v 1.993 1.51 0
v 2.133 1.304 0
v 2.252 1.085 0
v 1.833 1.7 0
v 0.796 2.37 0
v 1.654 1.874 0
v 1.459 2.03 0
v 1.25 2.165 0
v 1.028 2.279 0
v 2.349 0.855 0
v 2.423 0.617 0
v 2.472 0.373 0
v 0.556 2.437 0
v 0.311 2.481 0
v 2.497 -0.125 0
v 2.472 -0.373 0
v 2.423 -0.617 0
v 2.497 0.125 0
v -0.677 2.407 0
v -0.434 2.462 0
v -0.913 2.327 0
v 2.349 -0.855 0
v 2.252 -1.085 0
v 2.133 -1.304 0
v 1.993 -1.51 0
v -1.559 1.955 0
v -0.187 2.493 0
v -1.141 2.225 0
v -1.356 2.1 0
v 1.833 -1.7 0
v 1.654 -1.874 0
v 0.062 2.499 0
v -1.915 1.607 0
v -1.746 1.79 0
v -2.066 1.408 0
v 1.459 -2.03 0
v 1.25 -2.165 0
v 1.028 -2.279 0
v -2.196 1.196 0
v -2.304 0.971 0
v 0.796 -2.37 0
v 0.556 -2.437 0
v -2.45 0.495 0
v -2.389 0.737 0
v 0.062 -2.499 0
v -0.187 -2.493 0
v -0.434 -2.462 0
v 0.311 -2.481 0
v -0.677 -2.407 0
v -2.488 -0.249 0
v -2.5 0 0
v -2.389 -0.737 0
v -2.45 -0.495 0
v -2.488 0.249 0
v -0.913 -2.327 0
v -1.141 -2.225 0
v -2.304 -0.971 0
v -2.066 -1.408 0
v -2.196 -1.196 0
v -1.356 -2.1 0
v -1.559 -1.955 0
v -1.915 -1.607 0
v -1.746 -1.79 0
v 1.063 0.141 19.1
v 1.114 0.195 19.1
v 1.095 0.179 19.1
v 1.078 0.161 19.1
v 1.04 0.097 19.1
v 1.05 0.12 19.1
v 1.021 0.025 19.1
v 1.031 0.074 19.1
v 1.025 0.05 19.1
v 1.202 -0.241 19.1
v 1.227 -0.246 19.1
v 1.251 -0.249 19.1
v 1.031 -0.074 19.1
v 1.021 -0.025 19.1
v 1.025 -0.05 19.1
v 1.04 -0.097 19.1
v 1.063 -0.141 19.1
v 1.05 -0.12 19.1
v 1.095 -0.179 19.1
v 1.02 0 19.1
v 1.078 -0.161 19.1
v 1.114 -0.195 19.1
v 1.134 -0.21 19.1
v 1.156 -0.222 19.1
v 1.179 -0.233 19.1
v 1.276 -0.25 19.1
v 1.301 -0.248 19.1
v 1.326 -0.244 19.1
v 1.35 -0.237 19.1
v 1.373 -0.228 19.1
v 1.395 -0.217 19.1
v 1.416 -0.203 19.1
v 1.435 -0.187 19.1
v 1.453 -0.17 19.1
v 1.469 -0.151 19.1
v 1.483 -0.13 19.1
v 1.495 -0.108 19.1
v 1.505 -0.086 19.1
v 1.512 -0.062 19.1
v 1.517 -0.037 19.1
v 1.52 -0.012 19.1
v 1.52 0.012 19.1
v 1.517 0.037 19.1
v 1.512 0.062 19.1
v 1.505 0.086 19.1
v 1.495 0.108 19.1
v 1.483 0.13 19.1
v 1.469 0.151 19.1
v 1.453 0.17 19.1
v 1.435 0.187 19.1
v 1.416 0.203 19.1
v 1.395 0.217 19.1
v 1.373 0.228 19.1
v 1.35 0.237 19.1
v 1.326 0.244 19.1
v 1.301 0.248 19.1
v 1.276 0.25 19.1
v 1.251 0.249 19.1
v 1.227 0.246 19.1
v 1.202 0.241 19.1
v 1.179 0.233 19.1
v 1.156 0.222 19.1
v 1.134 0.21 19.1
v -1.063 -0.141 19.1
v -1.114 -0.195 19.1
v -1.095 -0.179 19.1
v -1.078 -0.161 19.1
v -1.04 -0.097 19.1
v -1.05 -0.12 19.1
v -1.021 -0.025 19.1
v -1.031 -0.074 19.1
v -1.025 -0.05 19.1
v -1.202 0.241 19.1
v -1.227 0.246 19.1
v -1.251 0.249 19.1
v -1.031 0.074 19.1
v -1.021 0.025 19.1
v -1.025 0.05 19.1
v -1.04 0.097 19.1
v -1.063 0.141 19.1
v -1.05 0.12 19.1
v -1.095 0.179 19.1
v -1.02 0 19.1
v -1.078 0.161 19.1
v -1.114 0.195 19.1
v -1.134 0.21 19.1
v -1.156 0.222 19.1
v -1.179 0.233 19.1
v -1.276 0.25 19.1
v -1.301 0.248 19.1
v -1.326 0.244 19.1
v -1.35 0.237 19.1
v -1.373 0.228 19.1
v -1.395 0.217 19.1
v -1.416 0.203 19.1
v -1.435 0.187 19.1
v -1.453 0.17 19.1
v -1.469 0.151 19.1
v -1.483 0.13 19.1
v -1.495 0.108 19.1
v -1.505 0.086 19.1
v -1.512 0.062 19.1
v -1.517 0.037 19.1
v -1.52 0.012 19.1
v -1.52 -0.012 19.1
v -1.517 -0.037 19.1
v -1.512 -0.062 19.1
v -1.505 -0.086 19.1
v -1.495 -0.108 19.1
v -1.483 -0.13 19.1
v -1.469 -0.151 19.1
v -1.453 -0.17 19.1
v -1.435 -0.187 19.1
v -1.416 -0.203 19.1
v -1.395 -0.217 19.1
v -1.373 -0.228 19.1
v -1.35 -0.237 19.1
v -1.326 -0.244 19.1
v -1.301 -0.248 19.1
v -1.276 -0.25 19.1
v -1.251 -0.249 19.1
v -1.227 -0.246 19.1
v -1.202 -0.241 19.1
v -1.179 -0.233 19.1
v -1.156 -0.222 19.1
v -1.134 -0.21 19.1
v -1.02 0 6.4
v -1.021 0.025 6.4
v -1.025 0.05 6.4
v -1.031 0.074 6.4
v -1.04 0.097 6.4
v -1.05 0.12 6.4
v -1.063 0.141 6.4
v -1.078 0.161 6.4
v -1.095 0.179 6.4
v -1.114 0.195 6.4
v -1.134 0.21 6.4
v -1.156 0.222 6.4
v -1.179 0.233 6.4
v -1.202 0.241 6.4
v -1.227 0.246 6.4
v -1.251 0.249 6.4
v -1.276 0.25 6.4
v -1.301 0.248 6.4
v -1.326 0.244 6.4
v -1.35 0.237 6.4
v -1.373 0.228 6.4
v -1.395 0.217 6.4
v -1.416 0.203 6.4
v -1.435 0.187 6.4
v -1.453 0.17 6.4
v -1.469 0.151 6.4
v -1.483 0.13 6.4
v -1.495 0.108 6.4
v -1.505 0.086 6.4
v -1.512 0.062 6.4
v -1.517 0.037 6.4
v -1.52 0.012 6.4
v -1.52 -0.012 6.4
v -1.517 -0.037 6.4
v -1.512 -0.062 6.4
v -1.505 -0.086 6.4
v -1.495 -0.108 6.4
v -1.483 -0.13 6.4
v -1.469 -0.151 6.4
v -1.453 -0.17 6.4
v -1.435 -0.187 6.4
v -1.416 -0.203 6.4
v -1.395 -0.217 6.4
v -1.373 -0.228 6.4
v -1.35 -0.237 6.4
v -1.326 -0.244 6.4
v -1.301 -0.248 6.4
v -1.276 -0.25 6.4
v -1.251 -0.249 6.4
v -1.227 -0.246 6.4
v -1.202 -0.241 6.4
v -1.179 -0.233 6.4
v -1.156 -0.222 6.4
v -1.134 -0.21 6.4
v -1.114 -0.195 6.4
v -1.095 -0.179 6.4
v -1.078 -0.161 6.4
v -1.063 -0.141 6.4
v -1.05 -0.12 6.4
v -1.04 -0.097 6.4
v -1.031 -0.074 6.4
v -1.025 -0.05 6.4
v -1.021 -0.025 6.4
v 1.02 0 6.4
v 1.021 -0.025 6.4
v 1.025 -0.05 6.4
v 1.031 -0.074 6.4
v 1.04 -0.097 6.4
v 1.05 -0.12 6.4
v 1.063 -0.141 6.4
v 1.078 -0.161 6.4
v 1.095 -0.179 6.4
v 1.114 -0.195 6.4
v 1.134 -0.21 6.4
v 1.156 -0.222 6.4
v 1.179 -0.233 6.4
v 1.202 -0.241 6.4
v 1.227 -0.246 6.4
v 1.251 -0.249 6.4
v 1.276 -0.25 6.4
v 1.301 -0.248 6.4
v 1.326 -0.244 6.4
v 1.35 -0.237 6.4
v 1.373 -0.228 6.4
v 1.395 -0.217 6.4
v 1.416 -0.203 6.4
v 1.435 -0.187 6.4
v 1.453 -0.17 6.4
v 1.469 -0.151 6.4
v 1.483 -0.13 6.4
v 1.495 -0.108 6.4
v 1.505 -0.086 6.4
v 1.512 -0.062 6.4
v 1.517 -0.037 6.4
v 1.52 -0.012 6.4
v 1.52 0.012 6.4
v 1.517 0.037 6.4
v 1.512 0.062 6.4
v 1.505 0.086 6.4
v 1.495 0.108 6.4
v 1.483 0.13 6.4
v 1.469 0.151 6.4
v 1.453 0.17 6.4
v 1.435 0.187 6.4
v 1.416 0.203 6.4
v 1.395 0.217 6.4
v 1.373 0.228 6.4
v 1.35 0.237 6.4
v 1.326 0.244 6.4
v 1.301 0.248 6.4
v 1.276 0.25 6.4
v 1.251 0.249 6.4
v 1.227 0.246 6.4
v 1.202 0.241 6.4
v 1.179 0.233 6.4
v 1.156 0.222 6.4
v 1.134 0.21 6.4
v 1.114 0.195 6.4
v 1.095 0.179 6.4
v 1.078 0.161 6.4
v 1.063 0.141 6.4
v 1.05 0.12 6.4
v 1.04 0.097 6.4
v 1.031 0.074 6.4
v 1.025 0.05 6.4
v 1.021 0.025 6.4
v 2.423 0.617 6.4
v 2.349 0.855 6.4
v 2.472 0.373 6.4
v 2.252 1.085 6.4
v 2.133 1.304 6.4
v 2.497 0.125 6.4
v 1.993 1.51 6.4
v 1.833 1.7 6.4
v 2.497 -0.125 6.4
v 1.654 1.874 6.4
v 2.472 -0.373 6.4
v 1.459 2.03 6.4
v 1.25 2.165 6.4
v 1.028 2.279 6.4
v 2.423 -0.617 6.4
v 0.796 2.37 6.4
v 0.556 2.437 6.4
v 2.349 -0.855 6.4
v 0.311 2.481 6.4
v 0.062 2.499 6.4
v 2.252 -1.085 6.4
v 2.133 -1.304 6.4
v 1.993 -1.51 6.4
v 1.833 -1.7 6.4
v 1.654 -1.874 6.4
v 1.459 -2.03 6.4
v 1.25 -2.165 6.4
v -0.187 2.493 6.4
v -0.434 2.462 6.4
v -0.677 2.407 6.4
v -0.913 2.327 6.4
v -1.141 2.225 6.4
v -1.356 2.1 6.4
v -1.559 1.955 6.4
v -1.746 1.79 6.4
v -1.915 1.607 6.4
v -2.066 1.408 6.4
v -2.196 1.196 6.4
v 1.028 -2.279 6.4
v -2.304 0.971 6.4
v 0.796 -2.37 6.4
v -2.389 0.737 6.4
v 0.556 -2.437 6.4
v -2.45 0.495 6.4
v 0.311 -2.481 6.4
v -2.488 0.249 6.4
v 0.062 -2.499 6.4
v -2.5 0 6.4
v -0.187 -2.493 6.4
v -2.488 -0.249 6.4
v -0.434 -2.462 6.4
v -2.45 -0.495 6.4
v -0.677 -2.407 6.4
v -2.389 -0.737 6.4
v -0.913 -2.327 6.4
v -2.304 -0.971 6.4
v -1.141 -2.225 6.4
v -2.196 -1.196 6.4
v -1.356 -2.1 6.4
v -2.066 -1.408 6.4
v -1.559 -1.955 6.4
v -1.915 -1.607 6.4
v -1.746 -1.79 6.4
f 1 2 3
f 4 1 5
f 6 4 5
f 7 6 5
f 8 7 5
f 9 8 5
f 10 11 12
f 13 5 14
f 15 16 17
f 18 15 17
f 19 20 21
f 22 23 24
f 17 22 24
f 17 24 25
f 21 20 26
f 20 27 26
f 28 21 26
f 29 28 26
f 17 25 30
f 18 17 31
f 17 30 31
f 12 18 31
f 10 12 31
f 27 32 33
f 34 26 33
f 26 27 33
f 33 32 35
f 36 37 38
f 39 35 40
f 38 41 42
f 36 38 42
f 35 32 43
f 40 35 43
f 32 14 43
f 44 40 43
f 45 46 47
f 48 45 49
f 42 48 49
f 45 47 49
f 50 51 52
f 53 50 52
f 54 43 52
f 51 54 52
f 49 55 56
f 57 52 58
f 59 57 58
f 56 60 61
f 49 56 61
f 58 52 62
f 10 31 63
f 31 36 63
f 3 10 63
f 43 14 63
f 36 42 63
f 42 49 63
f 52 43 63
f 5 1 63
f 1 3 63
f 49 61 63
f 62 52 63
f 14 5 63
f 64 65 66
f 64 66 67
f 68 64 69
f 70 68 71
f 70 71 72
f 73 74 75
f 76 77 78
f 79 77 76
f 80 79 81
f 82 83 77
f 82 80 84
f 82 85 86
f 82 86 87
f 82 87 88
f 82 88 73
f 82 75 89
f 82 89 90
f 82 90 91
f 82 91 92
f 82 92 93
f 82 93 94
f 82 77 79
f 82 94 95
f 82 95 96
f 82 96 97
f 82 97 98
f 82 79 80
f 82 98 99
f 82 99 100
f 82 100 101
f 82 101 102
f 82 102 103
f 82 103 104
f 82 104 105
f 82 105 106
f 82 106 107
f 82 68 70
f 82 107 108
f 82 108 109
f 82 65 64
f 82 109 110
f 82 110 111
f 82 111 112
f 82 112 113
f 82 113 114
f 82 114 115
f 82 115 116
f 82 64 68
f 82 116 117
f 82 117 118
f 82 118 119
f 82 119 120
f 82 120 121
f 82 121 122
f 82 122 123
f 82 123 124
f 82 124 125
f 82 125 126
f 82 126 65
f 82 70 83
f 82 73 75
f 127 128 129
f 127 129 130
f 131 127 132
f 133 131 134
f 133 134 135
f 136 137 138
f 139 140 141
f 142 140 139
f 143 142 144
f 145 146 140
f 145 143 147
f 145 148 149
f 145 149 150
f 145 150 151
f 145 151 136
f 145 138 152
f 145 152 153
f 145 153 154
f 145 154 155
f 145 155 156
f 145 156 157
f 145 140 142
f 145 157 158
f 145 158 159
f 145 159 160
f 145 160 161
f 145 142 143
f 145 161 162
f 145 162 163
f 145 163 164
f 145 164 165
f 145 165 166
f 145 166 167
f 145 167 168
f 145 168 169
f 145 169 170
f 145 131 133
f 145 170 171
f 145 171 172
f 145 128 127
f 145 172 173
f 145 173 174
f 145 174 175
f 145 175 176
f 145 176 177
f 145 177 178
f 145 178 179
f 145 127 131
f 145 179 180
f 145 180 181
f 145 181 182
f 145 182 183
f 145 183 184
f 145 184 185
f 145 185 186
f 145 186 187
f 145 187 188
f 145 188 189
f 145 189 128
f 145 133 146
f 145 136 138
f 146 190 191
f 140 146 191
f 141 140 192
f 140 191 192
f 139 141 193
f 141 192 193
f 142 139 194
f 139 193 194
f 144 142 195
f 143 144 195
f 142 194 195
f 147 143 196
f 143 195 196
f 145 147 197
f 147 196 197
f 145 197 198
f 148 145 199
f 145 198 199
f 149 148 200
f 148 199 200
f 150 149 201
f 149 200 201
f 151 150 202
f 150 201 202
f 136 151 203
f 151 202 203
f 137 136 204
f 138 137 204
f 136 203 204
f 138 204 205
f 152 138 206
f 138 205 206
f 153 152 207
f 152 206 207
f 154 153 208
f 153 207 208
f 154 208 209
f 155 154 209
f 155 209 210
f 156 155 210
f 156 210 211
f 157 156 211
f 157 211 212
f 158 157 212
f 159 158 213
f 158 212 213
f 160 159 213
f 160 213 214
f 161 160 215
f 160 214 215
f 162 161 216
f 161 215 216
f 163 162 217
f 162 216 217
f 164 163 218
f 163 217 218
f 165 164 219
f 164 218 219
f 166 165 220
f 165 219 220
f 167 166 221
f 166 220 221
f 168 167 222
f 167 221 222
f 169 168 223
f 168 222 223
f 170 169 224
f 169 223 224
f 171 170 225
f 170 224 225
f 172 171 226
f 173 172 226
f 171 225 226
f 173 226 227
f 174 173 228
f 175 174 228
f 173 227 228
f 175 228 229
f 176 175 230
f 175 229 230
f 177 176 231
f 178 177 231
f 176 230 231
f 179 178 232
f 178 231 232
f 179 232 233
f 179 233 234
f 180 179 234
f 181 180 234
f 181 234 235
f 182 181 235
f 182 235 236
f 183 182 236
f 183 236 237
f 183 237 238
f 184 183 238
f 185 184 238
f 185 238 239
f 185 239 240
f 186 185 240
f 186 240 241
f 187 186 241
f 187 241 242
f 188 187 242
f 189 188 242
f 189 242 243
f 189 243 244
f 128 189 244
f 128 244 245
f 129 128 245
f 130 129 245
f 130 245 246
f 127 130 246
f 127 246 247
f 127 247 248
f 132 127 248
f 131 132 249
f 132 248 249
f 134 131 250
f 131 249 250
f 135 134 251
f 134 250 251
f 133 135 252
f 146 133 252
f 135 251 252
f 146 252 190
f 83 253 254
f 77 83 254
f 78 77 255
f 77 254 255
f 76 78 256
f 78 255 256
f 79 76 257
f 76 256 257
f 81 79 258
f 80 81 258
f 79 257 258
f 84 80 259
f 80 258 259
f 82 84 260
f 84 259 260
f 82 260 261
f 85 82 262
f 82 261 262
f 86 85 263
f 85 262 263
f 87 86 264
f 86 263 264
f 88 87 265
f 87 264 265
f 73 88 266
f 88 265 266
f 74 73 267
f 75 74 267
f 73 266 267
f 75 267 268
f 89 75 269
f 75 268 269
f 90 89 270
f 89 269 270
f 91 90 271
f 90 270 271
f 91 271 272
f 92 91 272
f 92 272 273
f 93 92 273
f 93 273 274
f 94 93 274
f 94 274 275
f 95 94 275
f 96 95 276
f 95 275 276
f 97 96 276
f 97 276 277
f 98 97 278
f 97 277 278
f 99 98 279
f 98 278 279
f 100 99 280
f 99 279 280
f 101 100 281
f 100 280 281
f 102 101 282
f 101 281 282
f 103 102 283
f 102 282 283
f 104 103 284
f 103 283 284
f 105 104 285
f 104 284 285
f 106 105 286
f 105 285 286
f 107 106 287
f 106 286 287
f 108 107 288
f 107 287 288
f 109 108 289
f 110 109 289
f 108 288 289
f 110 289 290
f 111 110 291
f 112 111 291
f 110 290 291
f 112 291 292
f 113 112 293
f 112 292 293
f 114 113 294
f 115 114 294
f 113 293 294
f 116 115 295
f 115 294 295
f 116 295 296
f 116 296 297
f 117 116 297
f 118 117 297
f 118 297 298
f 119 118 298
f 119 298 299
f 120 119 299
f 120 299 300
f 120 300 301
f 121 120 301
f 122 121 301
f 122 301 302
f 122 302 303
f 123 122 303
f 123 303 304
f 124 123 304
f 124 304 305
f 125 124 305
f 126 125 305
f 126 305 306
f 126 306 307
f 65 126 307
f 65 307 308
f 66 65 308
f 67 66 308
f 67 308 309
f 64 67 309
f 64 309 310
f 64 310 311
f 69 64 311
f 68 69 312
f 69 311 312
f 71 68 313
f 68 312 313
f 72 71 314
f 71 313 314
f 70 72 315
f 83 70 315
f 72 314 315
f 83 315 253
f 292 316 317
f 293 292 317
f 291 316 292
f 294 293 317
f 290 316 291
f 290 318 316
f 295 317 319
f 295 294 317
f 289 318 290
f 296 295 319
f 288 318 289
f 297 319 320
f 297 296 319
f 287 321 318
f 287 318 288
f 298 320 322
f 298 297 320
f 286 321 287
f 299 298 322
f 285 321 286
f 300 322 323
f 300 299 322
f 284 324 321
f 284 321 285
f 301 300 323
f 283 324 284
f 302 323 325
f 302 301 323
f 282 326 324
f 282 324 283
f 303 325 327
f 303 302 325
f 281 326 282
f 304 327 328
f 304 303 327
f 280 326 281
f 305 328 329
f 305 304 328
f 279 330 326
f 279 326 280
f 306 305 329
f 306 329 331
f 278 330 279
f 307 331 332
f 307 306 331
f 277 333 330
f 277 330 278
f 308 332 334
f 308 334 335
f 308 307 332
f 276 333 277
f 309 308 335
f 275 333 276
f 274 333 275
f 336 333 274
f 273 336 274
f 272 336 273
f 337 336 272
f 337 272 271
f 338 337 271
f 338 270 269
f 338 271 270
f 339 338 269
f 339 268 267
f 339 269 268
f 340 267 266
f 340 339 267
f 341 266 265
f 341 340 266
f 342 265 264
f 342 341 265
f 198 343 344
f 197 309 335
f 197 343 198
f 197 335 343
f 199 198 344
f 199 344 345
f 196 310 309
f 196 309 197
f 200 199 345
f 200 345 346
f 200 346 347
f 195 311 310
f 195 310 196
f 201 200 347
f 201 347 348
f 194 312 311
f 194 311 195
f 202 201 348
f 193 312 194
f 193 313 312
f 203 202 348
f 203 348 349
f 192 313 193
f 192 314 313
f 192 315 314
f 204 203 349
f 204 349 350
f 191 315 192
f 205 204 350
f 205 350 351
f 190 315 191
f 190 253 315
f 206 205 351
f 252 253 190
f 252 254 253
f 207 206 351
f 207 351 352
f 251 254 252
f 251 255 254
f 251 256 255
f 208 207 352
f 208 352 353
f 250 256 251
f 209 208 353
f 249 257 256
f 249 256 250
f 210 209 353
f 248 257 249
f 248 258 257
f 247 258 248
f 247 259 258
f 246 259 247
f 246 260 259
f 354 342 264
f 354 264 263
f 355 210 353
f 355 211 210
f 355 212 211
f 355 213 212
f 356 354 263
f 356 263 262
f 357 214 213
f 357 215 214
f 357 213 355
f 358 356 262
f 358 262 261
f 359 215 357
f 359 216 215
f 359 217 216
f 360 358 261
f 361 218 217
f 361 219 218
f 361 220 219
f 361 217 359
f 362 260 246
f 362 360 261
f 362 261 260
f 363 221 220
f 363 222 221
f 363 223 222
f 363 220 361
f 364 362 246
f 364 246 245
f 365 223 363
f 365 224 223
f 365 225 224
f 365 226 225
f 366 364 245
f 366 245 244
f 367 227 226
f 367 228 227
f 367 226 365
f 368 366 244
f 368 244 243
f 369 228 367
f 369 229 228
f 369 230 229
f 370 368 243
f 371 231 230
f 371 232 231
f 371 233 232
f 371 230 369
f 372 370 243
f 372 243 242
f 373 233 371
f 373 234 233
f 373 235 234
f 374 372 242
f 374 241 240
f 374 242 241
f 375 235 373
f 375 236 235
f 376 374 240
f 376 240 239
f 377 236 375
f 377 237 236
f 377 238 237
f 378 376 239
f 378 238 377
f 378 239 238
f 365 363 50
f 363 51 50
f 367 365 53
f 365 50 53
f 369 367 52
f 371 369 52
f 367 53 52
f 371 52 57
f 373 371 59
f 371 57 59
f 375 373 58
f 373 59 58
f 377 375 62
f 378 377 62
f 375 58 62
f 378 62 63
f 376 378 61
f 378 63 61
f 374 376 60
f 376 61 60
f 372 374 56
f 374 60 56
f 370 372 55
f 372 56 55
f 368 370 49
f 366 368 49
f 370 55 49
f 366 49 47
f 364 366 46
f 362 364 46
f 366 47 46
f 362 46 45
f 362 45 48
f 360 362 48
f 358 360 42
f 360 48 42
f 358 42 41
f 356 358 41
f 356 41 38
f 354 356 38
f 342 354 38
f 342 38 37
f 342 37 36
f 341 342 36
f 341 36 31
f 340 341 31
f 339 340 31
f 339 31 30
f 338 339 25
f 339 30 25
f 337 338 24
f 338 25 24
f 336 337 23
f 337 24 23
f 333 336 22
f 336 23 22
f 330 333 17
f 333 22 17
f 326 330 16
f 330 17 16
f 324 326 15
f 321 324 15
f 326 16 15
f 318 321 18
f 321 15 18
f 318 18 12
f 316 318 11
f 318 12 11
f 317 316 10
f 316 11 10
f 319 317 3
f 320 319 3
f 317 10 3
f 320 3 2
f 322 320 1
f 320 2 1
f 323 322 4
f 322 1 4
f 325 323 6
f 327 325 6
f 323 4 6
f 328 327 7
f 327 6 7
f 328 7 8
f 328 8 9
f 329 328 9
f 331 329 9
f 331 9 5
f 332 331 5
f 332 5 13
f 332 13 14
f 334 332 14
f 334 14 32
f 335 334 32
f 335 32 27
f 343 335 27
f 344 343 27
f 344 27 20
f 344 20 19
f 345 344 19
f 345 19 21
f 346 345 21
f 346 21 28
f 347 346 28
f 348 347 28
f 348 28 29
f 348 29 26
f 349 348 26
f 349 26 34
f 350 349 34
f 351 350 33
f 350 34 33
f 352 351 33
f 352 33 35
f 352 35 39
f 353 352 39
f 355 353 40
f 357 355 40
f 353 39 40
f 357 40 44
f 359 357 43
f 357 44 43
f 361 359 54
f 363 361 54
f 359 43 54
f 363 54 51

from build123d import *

# Parameters (mm, degrees)
SKETCH_1_R      = 2.5
EXTRUDE_1_DEPTH = 5.4
SKETCH_2_R      = 2.5
EXTRUDE_2_DEPTH = 1
SKETCH_3_R      = 0.25
EXTRUDE_3_DEPTH = 12.7


with BuildPart() as part:
    # 草图1 → 拉伸1 (new body)
    with BuildSketch(Plane.XY):
        with Locations(Location((0, 0, 0), (0, 0, 180))):
            Circle(SKETCH_1_R)
    extrude(amount=EXTRUDE_1_DEPTH)

    # 草图2 → 拉伸2 (add)
    with BuildSketch(Plane.XY.offset(5.4)):
        with Locations(Location((0, 0, 0), (0, 0, 180))):
            Circle(SKETCH_2_R)
    extrude(amount=EXTRUDE_2_DEPTH)

    # 草图3 → 拉伸3 (add)
    with BuildSketch(Plane.XY.offset(6.4)):
        with Locations((-1.27, 0)):
            Circle(SKETCH_3_R)
        with Locations(Location((1.27, 0, 0), (0, 0, 180))):
            Circle(SKETCH_3_R)
    extrude(amount=EXTRUDE_3_DEPTH)


solid = part.part
